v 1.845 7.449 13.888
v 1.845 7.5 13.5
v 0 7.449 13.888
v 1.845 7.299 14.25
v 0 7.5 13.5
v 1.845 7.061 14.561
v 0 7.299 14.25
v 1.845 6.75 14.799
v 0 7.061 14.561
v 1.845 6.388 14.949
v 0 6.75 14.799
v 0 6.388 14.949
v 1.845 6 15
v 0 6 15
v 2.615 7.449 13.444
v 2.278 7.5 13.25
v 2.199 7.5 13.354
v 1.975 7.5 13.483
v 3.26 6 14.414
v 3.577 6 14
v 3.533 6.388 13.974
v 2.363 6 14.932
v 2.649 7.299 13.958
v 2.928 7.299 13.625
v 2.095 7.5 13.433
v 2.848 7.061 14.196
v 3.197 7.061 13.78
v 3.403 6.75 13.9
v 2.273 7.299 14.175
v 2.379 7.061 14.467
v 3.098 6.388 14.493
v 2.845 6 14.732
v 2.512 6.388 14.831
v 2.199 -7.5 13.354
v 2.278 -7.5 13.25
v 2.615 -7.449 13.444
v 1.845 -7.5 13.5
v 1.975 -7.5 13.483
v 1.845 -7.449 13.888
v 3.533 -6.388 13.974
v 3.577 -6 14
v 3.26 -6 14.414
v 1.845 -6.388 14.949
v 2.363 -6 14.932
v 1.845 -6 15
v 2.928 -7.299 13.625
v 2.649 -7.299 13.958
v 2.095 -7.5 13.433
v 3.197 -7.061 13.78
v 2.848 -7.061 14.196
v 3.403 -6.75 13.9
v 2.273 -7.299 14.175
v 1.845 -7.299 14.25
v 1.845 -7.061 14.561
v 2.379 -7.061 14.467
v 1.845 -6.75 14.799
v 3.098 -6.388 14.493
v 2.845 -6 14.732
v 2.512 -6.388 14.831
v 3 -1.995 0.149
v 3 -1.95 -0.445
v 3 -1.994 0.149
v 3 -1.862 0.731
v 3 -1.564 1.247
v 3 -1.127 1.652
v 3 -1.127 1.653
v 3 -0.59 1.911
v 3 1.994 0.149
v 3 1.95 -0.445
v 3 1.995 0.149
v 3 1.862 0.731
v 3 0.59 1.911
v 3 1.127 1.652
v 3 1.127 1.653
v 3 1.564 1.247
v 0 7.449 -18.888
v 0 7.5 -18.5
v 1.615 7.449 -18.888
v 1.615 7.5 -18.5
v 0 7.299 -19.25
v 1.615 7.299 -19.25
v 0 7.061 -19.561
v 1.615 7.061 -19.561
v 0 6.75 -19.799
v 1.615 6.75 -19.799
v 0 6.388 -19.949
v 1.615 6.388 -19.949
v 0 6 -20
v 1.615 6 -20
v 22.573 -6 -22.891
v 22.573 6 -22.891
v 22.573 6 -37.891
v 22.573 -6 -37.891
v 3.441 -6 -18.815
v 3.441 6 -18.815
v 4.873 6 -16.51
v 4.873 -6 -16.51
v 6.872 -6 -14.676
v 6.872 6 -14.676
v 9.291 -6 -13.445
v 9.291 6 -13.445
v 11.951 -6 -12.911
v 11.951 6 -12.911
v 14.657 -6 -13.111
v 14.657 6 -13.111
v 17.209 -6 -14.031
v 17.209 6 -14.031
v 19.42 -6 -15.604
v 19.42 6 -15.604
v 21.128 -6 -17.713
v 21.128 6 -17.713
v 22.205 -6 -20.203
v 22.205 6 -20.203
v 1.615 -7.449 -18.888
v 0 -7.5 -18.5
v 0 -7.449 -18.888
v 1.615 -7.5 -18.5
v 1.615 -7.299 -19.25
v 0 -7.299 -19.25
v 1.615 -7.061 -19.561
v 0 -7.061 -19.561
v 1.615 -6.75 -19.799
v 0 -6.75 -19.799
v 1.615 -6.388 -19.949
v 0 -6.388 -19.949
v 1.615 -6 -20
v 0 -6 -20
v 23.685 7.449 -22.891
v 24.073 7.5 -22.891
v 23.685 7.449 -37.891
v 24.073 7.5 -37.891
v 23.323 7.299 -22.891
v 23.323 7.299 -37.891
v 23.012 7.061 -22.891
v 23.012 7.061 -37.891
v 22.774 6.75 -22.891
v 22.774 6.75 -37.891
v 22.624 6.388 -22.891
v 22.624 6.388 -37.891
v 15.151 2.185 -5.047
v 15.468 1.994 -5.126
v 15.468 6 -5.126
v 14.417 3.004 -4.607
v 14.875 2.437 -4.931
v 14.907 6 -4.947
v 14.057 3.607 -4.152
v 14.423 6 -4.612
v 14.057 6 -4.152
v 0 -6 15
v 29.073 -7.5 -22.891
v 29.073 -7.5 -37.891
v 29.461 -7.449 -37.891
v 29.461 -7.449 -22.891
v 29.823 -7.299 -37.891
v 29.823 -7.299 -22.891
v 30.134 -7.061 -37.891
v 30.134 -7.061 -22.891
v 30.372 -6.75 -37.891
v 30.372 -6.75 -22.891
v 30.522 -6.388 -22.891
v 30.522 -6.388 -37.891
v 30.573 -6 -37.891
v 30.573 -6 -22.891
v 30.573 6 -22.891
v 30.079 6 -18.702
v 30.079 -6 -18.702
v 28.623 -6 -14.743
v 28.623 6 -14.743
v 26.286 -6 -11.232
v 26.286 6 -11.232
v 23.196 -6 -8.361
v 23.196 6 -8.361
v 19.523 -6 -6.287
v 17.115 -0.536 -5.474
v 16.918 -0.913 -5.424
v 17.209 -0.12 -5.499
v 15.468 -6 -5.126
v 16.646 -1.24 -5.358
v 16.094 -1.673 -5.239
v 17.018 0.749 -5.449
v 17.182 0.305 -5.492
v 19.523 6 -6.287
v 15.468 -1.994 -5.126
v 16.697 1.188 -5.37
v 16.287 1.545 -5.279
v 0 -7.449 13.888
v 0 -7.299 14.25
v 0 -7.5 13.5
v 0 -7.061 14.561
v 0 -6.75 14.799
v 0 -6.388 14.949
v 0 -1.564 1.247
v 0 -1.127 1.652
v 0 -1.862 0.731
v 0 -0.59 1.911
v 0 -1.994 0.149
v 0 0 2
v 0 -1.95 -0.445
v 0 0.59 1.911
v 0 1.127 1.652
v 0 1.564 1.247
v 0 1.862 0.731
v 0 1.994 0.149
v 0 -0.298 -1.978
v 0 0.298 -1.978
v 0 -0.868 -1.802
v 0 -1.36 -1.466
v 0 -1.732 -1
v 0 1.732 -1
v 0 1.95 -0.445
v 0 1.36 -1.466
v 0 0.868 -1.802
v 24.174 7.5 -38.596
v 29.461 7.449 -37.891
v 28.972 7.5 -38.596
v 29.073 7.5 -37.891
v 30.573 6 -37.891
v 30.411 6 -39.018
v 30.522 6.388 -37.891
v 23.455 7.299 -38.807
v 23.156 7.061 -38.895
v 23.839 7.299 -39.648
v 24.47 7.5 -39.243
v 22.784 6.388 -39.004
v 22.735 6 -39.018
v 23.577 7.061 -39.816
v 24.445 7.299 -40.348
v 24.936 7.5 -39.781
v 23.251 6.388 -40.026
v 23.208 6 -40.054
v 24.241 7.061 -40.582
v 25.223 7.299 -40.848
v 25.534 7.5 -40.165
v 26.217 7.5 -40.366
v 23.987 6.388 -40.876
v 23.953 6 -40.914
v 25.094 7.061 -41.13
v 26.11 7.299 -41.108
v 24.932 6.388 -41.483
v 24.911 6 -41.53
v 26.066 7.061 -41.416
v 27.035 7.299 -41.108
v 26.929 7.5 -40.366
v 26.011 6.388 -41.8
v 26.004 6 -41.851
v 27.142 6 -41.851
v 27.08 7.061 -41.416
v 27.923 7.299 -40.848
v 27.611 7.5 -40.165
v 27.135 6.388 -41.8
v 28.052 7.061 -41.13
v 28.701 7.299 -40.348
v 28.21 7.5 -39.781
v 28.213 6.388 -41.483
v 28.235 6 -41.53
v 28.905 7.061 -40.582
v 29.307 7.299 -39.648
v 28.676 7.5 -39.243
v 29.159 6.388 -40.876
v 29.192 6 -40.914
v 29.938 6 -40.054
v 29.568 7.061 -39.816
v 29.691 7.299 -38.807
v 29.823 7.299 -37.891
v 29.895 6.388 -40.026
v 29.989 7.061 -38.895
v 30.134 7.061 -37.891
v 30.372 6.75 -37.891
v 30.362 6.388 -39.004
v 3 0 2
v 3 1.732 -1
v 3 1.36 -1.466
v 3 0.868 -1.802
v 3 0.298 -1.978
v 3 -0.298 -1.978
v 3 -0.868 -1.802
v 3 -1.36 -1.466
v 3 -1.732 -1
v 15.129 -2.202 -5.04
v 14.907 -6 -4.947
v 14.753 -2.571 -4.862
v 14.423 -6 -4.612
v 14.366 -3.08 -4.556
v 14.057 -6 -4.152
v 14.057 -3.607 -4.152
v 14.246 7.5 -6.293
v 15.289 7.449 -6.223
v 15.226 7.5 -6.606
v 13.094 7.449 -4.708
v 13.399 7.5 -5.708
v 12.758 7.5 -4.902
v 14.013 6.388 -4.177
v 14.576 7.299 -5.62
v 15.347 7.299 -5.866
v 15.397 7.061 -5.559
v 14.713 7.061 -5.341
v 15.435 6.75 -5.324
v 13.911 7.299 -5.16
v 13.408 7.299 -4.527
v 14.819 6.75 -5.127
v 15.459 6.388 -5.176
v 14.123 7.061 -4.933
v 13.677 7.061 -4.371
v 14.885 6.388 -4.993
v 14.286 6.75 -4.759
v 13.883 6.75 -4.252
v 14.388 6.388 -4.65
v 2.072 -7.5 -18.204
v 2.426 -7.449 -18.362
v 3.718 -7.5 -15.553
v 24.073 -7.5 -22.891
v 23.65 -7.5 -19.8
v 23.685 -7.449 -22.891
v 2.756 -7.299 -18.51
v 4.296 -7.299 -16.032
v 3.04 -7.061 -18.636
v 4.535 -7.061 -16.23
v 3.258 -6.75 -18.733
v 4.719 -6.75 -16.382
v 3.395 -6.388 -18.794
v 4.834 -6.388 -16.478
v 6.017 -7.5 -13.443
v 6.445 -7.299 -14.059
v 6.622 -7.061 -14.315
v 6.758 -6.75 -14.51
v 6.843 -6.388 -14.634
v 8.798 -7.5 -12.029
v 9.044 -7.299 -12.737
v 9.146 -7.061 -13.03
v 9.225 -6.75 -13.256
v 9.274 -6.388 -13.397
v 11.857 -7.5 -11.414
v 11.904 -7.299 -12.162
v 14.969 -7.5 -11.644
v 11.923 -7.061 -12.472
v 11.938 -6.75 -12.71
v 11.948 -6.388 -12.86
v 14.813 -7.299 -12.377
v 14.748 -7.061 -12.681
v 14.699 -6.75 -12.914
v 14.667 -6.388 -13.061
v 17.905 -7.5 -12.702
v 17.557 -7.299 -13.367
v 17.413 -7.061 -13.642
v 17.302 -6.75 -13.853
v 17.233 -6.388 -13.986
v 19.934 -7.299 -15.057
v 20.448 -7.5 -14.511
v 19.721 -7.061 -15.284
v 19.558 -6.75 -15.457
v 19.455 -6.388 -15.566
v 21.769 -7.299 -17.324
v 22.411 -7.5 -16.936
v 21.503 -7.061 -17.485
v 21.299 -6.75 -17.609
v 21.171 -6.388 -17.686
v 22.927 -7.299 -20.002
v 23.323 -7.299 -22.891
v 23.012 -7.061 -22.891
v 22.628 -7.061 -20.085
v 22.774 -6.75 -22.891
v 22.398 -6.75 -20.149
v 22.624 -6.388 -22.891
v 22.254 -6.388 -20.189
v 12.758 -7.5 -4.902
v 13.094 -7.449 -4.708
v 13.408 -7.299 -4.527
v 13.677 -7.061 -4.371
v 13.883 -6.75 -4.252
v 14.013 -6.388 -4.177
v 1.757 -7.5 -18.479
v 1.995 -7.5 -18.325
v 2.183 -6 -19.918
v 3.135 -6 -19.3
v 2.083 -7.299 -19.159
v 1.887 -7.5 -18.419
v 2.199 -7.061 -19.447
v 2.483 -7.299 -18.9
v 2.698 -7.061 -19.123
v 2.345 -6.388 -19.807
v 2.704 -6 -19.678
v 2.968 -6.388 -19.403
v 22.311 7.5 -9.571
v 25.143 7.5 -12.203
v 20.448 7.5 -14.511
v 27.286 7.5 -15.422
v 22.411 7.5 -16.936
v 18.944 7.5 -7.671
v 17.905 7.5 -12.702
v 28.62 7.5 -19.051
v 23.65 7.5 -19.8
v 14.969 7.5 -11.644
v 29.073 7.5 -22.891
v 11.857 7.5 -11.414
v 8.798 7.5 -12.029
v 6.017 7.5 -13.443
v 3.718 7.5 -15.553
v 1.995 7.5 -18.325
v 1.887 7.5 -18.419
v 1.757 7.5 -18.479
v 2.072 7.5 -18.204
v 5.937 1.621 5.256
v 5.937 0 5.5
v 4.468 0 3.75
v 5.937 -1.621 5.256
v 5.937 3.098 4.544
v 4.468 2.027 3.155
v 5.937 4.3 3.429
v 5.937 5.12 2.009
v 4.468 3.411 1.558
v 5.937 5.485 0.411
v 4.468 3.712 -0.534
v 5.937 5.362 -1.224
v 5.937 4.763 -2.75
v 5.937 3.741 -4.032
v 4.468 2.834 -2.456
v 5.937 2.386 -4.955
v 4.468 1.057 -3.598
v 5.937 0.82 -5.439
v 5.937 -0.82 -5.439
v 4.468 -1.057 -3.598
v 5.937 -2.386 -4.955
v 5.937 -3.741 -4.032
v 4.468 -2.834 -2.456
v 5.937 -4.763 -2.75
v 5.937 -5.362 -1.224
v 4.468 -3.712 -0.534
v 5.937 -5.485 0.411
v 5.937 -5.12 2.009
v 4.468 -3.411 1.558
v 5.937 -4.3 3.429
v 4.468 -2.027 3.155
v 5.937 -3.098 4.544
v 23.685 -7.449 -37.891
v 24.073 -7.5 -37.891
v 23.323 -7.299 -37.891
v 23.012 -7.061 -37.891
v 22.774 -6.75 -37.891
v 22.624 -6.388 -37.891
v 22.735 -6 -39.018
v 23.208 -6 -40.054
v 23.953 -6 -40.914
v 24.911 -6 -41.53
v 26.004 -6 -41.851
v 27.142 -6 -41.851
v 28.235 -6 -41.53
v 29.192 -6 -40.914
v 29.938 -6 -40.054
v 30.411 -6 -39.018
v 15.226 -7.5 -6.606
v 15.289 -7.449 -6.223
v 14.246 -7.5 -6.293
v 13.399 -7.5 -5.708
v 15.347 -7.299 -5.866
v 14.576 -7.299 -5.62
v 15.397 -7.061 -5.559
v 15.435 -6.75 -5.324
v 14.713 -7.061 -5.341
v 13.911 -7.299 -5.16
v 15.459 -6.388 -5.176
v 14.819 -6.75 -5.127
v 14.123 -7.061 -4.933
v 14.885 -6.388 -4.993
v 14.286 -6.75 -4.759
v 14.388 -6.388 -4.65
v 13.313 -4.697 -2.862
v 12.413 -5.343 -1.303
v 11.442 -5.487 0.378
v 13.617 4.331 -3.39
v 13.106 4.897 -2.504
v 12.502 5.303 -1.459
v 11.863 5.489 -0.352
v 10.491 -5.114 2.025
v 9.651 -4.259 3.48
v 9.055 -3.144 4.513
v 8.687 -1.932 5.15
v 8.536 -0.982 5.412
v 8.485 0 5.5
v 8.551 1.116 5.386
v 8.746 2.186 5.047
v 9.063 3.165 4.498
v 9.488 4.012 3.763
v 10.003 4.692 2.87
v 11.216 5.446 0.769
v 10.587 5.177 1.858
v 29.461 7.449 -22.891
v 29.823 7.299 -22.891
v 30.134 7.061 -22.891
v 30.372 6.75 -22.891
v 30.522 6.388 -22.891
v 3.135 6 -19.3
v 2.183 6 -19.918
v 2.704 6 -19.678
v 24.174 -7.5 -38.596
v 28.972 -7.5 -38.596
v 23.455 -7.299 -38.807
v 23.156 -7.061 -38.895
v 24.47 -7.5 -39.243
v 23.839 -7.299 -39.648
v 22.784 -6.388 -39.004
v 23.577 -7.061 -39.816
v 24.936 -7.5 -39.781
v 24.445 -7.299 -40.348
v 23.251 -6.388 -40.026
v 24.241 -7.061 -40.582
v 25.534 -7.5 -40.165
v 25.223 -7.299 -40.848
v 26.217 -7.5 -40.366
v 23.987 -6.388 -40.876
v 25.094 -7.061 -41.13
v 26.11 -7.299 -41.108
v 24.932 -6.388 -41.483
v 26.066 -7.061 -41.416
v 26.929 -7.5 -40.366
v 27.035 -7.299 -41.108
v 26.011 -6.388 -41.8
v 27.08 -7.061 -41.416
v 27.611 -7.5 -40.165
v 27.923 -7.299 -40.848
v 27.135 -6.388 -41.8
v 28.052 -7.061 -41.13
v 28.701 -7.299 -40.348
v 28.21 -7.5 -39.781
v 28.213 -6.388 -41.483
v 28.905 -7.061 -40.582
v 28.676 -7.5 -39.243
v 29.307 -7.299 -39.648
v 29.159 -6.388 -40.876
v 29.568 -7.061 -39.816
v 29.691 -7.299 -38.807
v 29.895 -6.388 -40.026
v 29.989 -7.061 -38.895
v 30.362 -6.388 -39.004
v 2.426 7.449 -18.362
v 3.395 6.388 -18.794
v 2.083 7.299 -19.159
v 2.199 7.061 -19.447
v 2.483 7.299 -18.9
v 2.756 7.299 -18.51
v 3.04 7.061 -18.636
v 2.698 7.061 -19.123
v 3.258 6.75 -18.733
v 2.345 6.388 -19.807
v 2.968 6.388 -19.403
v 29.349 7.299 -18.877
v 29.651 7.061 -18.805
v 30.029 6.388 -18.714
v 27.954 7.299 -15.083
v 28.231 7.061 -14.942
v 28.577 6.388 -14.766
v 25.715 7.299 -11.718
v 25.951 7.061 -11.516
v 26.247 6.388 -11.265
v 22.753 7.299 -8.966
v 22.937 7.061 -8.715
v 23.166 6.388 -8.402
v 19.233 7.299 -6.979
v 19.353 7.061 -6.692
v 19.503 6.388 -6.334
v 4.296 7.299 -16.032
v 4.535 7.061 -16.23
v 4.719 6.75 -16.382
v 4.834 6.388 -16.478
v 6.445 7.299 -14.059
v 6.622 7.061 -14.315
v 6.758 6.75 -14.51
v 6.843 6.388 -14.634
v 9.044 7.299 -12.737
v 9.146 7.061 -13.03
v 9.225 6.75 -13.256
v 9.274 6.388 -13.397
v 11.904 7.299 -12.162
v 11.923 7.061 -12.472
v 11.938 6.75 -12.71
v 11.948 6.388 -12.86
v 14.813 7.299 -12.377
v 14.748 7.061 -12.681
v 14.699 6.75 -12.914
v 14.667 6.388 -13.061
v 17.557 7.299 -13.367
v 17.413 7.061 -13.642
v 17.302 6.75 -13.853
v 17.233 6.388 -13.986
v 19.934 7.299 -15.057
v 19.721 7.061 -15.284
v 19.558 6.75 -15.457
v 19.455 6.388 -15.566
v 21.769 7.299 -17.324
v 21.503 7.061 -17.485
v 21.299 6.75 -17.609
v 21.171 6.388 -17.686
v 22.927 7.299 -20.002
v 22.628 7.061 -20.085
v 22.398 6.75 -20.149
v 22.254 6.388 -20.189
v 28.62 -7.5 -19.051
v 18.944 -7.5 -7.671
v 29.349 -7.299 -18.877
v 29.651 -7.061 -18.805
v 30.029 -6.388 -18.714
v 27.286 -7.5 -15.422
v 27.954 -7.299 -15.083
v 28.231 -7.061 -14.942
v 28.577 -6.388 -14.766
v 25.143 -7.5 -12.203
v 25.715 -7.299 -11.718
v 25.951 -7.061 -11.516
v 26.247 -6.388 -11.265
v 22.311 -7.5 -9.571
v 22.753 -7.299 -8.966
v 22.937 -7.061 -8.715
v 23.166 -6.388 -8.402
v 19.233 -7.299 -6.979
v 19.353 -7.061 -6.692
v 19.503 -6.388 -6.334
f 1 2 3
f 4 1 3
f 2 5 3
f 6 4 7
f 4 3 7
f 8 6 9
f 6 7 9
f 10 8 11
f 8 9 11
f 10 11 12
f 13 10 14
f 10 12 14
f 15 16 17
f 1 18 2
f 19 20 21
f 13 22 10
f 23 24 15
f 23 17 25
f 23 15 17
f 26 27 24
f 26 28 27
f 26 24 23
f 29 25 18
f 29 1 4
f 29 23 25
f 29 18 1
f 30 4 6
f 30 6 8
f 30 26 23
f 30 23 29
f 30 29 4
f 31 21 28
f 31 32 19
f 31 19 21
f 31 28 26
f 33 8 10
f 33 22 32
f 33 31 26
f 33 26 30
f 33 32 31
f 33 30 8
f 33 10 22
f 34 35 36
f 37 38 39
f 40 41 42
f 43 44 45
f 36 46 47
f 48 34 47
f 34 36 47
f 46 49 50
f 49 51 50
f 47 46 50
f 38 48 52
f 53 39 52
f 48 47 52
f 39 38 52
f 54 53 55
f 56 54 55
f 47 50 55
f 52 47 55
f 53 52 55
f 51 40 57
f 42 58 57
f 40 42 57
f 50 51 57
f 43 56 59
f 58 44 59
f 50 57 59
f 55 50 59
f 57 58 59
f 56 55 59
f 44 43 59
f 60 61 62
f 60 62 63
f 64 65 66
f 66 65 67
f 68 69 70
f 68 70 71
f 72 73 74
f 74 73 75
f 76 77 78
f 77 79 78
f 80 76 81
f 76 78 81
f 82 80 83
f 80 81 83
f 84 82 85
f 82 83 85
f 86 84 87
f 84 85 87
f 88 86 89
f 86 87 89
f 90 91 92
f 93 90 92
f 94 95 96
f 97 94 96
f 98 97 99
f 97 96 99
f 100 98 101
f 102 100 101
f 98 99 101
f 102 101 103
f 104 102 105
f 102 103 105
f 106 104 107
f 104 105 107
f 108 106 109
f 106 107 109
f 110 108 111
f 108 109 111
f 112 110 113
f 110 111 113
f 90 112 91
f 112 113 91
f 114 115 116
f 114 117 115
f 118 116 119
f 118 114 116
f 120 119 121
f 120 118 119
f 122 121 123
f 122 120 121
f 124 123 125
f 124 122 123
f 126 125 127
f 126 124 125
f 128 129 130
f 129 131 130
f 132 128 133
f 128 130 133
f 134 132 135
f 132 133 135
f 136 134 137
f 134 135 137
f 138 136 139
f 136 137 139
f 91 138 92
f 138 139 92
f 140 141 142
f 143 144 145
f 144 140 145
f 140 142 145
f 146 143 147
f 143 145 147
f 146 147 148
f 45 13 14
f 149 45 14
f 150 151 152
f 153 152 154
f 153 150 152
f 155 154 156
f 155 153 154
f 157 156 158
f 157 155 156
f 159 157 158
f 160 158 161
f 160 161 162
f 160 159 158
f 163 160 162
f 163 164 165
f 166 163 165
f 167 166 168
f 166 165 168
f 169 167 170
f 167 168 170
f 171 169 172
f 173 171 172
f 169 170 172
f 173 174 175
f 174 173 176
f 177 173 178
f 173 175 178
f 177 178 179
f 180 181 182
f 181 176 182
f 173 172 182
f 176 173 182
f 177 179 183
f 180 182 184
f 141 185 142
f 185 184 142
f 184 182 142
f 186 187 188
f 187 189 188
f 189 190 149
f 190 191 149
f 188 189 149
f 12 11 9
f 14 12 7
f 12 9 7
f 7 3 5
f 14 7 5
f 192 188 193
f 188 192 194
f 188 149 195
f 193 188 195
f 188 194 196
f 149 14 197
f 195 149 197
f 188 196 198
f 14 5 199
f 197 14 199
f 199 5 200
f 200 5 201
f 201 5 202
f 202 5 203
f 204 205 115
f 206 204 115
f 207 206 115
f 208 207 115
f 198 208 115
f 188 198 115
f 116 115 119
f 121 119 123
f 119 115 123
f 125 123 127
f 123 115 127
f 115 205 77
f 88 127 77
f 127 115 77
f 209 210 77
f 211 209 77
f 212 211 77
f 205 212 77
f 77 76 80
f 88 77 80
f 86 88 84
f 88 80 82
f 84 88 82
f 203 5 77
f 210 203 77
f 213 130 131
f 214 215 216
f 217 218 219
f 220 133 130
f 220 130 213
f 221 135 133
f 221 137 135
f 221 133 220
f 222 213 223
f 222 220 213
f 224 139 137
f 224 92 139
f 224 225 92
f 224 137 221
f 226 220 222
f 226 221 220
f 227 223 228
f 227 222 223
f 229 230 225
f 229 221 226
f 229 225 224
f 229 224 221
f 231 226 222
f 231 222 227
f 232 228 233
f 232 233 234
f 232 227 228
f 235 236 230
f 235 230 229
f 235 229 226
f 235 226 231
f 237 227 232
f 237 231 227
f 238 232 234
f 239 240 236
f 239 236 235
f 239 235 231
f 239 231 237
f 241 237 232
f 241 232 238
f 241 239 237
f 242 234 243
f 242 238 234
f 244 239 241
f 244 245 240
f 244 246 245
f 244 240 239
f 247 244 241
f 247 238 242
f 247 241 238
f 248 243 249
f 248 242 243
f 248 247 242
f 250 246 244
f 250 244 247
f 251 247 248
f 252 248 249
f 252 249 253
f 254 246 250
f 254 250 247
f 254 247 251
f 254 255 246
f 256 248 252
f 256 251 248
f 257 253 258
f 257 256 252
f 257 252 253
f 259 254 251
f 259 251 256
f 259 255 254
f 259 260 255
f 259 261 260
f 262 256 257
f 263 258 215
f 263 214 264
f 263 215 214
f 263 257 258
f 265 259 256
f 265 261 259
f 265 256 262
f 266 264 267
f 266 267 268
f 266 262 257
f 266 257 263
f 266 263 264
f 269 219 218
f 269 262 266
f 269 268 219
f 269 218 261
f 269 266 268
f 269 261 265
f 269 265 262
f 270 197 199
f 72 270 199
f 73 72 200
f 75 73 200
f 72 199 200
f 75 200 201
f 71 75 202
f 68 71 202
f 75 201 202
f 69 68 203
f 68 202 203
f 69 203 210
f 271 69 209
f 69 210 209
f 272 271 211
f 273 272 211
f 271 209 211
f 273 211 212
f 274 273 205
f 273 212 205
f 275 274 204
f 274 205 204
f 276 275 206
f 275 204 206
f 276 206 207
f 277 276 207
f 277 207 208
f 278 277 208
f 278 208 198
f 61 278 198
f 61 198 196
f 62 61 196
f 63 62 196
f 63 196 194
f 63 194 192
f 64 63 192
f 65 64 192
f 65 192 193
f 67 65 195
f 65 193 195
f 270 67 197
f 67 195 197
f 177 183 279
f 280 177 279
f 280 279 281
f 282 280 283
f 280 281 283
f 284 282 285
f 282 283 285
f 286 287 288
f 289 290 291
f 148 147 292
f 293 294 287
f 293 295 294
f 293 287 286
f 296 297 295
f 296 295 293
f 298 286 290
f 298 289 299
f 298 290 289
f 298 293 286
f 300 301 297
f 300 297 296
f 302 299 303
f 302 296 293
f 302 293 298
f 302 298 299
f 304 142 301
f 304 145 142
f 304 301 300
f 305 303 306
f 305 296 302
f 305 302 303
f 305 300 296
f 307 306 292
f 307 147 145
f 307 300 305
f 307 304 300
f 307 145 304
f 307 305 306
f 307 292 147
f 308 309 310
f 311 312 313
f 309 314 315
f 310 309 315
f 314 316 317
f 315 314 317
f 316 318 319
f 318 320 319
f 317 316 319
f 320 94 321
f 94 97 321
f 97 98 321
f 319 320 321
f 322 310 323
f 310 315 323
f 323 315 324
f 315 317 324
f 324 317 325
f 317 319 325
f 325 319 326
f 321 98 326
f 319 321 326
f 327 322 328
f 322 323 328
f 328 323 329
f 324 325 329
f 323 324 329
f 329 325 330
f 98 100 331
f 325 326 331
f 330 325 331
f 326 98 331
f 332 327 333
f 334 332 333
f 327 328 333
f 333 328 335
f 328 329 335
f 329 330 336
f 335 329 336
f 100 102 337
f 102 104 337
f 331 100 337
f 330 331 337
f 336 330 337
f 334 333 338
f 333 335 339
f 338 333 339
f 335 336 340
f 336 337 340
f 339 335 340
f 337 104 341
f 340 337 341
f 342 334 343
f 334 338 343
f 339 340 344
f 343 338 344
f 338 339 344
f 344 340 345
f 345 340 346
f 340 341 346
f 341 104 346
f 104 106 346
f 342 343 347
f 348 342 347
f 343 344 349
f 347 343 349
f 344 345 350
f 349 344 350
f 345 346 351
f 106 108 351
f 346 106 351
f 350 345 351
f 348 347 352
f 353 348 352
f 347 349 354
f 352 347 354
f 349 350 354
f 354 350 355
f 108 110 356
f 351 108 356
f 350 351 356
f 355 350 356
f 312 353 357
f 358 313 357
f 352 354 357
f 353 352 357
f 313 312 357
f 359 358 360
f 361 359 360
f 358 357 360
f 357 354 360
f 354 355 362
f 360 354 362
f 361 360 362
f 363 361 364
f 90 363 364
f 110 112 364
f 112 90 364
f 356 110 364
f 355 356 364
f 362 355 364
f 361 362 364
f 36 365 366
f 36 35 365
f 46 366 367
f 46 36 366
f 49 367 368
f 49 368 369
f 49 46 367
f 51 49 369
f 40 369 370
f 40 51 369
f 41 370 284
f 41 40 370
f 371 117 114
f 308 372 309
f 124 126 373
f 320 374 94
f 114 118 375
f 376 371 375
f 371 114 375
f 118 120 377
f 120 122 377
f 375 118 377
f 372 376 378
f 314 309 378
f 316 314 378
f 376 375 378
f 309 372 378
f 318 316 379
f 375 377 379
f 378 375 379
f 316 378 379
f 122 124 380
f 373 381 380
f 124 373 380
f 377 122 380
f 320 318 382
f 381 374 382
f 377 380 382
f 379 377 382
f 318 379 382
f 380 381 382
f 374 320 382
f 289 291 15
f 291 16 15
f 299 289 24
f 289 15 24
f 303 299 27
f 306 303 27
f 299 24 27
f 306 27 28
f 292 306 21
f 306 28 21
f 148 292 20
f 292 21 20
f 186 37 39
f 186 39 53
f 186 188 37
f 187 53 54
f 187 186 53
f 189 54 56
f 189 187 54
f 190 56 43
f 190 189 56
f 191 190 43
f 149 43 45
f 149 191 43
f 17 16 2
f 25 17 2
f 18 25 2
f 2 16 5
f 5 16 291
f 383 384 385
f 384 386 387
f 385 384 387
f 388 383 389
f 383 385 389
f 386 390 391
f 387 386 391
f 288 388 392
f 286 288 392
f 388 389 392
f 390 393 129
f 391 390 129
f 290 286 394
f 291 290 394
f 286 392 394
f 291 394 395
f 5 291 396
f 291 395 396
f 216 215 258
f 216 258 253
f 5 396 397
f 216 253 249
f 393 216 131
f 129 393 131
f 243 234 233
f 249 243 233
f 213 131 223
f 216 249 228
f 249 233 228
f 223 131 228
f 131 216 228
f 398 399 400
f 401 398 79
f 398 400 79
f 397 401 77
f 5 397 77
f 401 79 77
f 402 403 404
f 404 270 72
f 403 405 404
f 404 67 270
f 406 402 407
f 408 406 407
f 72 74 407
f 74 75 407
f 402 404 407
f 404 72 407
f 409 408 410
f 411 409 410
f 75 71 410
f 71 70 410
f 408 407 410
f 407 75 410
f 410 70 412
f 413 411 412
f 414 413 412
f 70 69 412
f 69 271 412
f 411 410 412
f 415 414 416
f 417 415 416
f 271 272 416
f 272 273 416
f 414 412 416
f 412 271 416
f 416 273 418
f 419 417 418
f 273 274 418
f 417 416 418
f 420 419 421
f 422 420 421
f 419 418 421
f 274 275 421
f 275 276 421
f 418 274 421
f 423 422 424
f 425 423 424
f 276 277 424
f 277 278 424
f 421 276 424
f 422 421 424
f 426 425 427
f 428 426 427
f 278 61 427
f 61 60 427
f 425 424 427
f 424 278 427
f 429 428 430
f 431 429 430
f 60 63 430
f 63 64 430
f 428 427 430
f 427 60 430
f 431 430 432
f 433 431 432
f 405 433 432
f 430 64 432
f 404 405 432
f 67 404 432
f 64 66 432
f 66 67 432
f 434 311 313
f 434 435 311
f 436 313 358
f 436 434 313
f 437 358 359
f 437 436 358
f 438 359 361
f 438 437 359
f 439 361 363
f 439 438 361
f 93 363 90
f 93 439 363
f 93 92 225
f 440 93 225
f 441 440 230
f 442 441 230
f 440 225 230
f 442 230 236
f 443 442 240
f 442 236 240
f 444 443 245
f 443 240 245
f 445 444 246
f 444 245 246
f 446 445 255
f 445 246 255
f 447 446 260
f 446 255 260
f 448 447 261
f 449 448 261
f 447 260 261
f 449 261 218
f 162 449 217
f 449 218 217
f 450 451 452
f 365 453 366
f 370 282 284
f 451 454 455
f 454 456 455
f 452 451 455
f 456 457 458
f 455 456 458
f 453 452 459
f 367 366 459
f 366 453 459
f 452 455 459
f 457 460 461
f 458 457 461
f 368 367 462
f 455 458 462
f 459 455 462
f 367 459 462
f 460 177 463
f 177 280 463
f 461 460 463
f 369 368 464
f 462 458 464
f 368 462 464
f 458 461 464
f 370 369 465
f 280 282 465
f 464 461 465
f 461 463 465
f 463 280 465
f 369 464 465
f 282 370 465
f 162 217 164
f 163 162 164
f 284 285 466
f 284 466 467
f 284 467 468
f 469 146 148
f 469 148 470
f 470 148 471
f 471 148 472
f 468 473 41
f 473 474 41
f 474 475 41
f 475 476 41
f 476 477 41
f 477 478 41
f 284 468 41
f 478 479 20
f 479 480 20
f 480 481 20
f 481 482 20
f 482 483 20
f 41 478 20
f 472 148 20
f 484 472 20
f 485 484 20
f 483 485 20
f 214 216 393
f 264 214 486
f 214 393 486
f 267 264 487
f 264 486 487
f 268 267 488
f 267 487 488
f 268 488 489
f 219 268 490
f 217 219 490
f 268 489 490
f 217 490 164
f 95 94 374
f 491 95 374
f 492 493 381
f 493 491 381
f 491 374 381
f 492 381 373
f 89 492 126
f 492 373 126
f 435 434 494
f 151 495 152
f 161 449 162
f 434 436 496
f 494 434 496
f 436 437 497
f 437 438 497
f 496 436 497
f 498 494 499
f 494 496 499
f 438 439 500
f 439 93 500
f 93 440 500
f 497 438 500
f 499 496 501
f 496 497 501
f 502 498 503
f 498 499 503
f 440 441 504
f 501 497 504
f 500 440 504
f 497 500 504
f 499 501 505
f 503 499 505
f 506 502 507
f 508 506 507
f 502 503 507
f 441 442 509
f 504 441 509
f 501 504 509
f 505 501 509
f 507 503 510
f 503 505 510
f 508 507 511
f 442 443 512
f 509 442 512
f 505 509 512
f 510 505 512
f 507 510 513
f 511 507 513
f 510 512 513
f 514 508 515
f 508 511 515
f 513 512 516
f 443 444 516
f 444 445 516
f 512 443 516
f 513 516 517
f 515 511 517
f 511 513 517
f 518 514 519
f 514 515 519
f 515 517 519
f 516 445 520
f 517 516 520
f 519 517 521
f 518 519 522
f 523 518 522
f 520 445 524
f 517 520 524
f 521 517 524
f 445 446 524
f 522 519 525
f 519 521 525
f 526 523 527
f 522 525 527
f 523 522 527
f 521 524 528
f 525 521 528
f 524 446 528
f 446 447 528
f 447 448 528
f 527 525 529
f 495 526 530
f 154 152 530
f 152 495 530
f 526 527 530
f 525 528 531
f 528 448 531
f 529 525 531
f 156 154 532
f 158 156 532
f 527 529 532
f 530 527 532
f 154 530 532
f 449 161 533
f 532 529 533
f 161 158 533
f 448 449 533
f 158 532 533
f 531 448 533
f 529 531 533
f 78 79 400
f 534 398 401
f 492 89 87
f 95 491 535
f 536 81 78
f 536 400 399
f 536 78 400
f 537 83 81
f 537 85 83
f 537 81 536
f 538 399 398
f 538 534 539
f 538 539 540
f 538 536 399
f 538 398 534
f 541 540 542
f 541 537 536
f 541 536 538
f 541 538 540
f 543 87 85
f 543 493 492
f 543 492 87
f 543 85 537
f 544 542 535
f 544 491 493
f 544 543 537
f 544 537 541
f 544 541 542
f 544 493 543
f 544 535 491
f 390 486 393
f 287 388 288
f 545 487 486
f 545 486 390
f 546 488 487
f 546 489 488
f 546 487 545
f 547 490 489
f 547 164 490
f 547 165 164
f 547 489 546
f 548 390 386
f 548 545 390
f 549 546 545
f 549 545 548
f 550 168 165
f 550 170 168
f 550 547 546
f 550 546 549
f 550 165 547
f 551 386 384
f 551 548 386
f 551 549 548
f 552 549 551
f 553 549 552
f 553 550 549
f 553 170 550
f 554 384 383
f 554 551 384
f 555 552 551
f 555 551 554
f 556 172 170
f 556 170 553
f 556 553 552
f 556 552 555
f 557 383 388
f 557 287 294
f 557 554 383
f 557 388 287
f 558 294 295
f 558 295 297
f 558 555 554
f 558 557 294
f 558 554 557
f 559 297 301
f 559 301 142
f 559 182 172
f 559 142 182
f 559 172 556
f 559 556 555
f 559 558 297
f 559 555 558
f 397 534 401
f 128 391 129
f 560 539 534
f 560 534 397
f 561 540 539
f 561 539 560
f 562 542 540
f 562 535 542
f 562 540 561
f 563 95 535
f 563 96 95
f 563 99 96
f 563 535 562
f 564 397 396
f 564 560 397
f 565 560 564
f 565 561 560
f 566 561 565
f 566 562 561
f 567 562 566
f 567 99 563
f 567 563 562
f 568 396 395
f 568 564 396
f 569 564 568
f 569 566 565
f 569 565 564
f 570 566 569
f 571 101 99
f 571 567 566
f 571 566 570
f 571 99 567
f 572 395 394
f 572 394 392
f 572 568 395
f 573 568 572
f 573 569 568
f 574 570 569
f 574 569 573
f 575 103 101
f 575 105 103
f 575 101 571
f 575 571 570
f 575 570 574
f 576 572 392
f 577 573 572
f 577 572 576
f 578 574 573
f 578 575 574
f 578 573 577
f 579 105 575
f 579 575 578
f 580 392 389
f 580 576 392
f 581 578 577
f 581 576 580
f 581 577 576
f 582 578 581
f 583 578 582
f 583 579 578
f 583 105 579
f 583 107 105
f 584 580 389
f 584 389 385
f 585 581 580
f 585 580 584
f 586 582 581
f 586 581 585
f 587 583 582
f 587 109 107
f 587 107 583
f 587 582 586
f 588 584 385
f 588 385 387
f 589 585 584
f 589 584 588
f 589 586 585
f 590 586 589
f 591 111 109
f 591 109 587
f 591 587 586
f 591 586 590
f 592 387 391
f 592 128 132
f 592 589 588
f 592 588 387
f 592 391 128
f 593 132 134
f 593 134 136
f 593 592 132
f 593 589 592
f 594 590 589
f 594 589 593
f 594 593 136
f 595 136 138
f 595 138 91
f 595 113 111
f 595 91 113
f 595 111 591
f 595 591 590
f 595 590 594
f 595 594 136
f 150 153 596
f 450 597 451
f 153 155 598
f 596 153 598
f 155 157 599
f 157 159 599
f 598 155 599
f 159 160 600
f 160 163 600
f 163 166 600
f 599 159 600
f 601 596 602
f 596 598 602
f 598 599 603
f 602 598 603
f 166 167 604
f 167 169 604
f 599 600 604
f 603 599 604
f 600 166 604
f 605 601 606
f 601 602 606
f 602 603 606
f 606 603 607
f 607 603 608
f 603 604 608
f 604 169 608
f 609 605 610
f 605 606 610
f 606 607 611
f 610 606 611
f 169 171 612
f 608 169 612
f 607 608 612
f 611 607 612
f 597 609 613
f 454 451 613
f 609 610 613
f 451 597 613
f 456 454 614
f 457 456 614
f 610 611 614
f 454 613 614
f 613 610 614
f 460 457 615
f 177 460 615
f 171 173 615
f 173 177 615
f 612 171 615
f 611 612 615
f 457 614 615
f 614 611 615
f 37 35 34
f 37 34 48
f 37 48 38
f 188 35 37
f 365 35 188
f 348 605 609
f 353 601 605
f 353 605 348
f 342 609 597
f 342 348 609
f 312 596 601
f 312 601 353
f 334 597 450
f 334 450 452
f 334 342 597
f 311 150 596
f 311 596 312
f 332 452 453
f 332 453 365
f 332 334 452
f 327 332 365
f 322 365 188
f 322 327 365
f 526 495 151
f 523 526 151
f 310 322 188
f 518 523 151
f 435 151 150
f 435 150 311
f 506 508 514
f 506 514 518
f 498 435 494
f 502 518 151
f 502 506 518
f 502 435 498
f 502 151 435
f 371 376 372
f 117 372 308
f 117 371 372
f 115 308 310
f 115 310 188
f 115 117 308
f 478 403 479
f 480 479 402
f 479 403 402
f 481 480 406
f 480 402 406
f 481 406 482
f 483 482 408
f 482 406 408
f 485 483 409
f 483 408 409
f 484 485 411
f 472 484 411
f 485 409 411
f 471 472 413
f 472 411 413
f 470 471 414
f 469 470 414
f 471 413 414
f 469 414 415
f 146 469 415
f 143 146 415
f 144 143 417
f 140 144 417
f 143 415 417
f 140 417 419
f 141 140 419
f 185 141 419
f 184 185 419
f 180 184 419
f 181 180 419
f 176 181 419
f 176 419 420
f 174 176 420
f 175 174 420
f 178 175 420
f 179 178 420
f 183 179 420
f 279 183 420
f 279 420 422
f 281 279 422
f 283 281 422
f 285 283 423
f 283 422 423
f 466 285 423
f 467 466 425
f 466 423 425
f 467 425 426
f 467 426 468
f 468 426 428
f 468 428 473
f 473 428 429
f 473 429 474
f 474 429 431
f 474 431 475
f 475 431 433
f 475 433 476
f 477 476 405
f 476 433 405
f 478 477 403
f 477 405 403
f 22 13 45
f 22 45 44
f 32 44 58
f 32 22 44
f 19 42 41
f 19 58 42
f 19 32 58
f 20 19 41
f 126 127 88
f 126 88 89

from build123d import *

# Parameters (mm, degrees)
BOSS_EXTRU_1_DEPTH      = 7.5
CONG_1_R                = 2
ESQUISSE2_R             = 2
ENL_V_MAT_EXTRU_1_DEPTH = 3
ESQUISSE3_R             = 5.5
ENL_V_MAT_EXTRU_2_DEPTH = 51.709008317
CHANFREIN1_SIZE2        = 3.5
CHANFREIN1_SIZE         = 2.936848709
CONG_2_R                = 1.5


with BuildPart() as part:
    # Esquisse1 → Boss.-Extru.1 (new, symmetric)
    with BuildSketch(Plane(origin=(0, 0, 0), x_dir=(1, 0, 0), z_dir=(0, 1, 0))):
        with BuildLine():
            Line((3, -15), (0, -15))
            Line((0, -15), (0, 20))
            Line((0, 20), (3, 20))
            ThreePointArc((3, 20), (14.034261007, 12.998776376), (22.572863417, 22.891415916))
            Line((22.572863417, 22.891415916), (22.572863417, 37.891415916))
            ThreePointArc((22.572863417, 37.891415916), (26.572863417, 41.891415916), (30.572863417, 37.891415916))
            Line((30.572863417, 37.891415916), (30.572863417, 22.891415916))
            ThreePointArc((30.572863417, 22.891415916), (25.980595429, 10.881723069), (14.547005384, 5))
            Line((14.547005384, 5), (3, -15))
        make_face()
    extrude(amount=BOSS_EXTRU_1_DEPTH, both=True)

    # Congé1
    cong_1_edges = [part.edges().sort_by_distance(p)[0] for p in [
        (3, 0, -20),
        (14.547005384, 0, -5),
        (3, 0, 15),
    ]]
    fillet(cong_1_edges, radius=CONG_1_R)

    # Esquisse2 → Enlèv. mat.-Extru.1 (cut)
    with BuildSketch(Plane.ZY):
        Circle(ESQUISSE2_R)
    extrude(amount=-ENL_V_MAT_EXTRU_1_DEPTH, mode=Mode.SUBTRACT)

    # Esquisse3 → Enlèv. mat.-Extru.2 (cut, through all)
    with BuildSketch(Plane.ZY.offset(-3)):
        Circle(ESQUISSE3_R)
    extrude(amount=-ENL_V_MAT_EXTRU_2_DEPTH, mode=Mode.SUBTRACT)

    # Chanfrein1
    chanfrein1_edges = [part.edges().sort_by_distance(p)[0] for p in [
        (3, 0, -5.5),
    ]]
    chanfrein1_side = [part.faces().sort_by_distance(p)[0] for p in [
        (3.058736974, 0, -5.5),
    ]]
    chamfer(chanfrein1_edges, length=CHANFREIN1_SIZE - 0.0001, length2=CHANFREIN1_SIZE2 - 0.0001, reference=chanfrein1_side[0])  # a hair under: the kernel refuses the full size

    # Congé2
    cong_2_edges = [part.edges().sort_by_distance(p)[0] for p in [
        (30.572863417, -7.5, -30.391415916),
        (0.922649731, -7.5, 15),
        (30.572863417, 7.5, -30.391415916),
        (26.572863417, 7.5, -41.891415916),
        (22.572863417, 7.5, -30.391415916),
        (14.656699474, 7.5, -13.110944185),
        (0.807516434, -7.5, -20),
        (0.807516434, 7.5, -20),
        (26.286115703, -7.5, -11.231797066),
        (8.81730911, -7.5, 4.924125057),
        (2.845299462, -7.5, 14.732050808),
        (2.703501524, -7.5, -19.677866498),
        (8.81730911, 7.5, 4.924125057),
        (26.286115703, 7.5, -11.231797066),
        (2.845299462, 7.5, 14.732050808),
        (2.703501524, 7.5, -19.677866498),
        (14.652846189, -7.5, -4.797480755),
        (14.652846189, 7.5, -4.797480755),
        (0.922649731, 7.5, 15),
        (14.656699474, -7.5, -13.110944185),
        (22.572863417, -7.5, -30.391415916),
        (26.572863417, -7.5, -41.891415916),
    ]]
    fillet(cong_2_edges, radius=CONG_2_R)


solid = part.part
